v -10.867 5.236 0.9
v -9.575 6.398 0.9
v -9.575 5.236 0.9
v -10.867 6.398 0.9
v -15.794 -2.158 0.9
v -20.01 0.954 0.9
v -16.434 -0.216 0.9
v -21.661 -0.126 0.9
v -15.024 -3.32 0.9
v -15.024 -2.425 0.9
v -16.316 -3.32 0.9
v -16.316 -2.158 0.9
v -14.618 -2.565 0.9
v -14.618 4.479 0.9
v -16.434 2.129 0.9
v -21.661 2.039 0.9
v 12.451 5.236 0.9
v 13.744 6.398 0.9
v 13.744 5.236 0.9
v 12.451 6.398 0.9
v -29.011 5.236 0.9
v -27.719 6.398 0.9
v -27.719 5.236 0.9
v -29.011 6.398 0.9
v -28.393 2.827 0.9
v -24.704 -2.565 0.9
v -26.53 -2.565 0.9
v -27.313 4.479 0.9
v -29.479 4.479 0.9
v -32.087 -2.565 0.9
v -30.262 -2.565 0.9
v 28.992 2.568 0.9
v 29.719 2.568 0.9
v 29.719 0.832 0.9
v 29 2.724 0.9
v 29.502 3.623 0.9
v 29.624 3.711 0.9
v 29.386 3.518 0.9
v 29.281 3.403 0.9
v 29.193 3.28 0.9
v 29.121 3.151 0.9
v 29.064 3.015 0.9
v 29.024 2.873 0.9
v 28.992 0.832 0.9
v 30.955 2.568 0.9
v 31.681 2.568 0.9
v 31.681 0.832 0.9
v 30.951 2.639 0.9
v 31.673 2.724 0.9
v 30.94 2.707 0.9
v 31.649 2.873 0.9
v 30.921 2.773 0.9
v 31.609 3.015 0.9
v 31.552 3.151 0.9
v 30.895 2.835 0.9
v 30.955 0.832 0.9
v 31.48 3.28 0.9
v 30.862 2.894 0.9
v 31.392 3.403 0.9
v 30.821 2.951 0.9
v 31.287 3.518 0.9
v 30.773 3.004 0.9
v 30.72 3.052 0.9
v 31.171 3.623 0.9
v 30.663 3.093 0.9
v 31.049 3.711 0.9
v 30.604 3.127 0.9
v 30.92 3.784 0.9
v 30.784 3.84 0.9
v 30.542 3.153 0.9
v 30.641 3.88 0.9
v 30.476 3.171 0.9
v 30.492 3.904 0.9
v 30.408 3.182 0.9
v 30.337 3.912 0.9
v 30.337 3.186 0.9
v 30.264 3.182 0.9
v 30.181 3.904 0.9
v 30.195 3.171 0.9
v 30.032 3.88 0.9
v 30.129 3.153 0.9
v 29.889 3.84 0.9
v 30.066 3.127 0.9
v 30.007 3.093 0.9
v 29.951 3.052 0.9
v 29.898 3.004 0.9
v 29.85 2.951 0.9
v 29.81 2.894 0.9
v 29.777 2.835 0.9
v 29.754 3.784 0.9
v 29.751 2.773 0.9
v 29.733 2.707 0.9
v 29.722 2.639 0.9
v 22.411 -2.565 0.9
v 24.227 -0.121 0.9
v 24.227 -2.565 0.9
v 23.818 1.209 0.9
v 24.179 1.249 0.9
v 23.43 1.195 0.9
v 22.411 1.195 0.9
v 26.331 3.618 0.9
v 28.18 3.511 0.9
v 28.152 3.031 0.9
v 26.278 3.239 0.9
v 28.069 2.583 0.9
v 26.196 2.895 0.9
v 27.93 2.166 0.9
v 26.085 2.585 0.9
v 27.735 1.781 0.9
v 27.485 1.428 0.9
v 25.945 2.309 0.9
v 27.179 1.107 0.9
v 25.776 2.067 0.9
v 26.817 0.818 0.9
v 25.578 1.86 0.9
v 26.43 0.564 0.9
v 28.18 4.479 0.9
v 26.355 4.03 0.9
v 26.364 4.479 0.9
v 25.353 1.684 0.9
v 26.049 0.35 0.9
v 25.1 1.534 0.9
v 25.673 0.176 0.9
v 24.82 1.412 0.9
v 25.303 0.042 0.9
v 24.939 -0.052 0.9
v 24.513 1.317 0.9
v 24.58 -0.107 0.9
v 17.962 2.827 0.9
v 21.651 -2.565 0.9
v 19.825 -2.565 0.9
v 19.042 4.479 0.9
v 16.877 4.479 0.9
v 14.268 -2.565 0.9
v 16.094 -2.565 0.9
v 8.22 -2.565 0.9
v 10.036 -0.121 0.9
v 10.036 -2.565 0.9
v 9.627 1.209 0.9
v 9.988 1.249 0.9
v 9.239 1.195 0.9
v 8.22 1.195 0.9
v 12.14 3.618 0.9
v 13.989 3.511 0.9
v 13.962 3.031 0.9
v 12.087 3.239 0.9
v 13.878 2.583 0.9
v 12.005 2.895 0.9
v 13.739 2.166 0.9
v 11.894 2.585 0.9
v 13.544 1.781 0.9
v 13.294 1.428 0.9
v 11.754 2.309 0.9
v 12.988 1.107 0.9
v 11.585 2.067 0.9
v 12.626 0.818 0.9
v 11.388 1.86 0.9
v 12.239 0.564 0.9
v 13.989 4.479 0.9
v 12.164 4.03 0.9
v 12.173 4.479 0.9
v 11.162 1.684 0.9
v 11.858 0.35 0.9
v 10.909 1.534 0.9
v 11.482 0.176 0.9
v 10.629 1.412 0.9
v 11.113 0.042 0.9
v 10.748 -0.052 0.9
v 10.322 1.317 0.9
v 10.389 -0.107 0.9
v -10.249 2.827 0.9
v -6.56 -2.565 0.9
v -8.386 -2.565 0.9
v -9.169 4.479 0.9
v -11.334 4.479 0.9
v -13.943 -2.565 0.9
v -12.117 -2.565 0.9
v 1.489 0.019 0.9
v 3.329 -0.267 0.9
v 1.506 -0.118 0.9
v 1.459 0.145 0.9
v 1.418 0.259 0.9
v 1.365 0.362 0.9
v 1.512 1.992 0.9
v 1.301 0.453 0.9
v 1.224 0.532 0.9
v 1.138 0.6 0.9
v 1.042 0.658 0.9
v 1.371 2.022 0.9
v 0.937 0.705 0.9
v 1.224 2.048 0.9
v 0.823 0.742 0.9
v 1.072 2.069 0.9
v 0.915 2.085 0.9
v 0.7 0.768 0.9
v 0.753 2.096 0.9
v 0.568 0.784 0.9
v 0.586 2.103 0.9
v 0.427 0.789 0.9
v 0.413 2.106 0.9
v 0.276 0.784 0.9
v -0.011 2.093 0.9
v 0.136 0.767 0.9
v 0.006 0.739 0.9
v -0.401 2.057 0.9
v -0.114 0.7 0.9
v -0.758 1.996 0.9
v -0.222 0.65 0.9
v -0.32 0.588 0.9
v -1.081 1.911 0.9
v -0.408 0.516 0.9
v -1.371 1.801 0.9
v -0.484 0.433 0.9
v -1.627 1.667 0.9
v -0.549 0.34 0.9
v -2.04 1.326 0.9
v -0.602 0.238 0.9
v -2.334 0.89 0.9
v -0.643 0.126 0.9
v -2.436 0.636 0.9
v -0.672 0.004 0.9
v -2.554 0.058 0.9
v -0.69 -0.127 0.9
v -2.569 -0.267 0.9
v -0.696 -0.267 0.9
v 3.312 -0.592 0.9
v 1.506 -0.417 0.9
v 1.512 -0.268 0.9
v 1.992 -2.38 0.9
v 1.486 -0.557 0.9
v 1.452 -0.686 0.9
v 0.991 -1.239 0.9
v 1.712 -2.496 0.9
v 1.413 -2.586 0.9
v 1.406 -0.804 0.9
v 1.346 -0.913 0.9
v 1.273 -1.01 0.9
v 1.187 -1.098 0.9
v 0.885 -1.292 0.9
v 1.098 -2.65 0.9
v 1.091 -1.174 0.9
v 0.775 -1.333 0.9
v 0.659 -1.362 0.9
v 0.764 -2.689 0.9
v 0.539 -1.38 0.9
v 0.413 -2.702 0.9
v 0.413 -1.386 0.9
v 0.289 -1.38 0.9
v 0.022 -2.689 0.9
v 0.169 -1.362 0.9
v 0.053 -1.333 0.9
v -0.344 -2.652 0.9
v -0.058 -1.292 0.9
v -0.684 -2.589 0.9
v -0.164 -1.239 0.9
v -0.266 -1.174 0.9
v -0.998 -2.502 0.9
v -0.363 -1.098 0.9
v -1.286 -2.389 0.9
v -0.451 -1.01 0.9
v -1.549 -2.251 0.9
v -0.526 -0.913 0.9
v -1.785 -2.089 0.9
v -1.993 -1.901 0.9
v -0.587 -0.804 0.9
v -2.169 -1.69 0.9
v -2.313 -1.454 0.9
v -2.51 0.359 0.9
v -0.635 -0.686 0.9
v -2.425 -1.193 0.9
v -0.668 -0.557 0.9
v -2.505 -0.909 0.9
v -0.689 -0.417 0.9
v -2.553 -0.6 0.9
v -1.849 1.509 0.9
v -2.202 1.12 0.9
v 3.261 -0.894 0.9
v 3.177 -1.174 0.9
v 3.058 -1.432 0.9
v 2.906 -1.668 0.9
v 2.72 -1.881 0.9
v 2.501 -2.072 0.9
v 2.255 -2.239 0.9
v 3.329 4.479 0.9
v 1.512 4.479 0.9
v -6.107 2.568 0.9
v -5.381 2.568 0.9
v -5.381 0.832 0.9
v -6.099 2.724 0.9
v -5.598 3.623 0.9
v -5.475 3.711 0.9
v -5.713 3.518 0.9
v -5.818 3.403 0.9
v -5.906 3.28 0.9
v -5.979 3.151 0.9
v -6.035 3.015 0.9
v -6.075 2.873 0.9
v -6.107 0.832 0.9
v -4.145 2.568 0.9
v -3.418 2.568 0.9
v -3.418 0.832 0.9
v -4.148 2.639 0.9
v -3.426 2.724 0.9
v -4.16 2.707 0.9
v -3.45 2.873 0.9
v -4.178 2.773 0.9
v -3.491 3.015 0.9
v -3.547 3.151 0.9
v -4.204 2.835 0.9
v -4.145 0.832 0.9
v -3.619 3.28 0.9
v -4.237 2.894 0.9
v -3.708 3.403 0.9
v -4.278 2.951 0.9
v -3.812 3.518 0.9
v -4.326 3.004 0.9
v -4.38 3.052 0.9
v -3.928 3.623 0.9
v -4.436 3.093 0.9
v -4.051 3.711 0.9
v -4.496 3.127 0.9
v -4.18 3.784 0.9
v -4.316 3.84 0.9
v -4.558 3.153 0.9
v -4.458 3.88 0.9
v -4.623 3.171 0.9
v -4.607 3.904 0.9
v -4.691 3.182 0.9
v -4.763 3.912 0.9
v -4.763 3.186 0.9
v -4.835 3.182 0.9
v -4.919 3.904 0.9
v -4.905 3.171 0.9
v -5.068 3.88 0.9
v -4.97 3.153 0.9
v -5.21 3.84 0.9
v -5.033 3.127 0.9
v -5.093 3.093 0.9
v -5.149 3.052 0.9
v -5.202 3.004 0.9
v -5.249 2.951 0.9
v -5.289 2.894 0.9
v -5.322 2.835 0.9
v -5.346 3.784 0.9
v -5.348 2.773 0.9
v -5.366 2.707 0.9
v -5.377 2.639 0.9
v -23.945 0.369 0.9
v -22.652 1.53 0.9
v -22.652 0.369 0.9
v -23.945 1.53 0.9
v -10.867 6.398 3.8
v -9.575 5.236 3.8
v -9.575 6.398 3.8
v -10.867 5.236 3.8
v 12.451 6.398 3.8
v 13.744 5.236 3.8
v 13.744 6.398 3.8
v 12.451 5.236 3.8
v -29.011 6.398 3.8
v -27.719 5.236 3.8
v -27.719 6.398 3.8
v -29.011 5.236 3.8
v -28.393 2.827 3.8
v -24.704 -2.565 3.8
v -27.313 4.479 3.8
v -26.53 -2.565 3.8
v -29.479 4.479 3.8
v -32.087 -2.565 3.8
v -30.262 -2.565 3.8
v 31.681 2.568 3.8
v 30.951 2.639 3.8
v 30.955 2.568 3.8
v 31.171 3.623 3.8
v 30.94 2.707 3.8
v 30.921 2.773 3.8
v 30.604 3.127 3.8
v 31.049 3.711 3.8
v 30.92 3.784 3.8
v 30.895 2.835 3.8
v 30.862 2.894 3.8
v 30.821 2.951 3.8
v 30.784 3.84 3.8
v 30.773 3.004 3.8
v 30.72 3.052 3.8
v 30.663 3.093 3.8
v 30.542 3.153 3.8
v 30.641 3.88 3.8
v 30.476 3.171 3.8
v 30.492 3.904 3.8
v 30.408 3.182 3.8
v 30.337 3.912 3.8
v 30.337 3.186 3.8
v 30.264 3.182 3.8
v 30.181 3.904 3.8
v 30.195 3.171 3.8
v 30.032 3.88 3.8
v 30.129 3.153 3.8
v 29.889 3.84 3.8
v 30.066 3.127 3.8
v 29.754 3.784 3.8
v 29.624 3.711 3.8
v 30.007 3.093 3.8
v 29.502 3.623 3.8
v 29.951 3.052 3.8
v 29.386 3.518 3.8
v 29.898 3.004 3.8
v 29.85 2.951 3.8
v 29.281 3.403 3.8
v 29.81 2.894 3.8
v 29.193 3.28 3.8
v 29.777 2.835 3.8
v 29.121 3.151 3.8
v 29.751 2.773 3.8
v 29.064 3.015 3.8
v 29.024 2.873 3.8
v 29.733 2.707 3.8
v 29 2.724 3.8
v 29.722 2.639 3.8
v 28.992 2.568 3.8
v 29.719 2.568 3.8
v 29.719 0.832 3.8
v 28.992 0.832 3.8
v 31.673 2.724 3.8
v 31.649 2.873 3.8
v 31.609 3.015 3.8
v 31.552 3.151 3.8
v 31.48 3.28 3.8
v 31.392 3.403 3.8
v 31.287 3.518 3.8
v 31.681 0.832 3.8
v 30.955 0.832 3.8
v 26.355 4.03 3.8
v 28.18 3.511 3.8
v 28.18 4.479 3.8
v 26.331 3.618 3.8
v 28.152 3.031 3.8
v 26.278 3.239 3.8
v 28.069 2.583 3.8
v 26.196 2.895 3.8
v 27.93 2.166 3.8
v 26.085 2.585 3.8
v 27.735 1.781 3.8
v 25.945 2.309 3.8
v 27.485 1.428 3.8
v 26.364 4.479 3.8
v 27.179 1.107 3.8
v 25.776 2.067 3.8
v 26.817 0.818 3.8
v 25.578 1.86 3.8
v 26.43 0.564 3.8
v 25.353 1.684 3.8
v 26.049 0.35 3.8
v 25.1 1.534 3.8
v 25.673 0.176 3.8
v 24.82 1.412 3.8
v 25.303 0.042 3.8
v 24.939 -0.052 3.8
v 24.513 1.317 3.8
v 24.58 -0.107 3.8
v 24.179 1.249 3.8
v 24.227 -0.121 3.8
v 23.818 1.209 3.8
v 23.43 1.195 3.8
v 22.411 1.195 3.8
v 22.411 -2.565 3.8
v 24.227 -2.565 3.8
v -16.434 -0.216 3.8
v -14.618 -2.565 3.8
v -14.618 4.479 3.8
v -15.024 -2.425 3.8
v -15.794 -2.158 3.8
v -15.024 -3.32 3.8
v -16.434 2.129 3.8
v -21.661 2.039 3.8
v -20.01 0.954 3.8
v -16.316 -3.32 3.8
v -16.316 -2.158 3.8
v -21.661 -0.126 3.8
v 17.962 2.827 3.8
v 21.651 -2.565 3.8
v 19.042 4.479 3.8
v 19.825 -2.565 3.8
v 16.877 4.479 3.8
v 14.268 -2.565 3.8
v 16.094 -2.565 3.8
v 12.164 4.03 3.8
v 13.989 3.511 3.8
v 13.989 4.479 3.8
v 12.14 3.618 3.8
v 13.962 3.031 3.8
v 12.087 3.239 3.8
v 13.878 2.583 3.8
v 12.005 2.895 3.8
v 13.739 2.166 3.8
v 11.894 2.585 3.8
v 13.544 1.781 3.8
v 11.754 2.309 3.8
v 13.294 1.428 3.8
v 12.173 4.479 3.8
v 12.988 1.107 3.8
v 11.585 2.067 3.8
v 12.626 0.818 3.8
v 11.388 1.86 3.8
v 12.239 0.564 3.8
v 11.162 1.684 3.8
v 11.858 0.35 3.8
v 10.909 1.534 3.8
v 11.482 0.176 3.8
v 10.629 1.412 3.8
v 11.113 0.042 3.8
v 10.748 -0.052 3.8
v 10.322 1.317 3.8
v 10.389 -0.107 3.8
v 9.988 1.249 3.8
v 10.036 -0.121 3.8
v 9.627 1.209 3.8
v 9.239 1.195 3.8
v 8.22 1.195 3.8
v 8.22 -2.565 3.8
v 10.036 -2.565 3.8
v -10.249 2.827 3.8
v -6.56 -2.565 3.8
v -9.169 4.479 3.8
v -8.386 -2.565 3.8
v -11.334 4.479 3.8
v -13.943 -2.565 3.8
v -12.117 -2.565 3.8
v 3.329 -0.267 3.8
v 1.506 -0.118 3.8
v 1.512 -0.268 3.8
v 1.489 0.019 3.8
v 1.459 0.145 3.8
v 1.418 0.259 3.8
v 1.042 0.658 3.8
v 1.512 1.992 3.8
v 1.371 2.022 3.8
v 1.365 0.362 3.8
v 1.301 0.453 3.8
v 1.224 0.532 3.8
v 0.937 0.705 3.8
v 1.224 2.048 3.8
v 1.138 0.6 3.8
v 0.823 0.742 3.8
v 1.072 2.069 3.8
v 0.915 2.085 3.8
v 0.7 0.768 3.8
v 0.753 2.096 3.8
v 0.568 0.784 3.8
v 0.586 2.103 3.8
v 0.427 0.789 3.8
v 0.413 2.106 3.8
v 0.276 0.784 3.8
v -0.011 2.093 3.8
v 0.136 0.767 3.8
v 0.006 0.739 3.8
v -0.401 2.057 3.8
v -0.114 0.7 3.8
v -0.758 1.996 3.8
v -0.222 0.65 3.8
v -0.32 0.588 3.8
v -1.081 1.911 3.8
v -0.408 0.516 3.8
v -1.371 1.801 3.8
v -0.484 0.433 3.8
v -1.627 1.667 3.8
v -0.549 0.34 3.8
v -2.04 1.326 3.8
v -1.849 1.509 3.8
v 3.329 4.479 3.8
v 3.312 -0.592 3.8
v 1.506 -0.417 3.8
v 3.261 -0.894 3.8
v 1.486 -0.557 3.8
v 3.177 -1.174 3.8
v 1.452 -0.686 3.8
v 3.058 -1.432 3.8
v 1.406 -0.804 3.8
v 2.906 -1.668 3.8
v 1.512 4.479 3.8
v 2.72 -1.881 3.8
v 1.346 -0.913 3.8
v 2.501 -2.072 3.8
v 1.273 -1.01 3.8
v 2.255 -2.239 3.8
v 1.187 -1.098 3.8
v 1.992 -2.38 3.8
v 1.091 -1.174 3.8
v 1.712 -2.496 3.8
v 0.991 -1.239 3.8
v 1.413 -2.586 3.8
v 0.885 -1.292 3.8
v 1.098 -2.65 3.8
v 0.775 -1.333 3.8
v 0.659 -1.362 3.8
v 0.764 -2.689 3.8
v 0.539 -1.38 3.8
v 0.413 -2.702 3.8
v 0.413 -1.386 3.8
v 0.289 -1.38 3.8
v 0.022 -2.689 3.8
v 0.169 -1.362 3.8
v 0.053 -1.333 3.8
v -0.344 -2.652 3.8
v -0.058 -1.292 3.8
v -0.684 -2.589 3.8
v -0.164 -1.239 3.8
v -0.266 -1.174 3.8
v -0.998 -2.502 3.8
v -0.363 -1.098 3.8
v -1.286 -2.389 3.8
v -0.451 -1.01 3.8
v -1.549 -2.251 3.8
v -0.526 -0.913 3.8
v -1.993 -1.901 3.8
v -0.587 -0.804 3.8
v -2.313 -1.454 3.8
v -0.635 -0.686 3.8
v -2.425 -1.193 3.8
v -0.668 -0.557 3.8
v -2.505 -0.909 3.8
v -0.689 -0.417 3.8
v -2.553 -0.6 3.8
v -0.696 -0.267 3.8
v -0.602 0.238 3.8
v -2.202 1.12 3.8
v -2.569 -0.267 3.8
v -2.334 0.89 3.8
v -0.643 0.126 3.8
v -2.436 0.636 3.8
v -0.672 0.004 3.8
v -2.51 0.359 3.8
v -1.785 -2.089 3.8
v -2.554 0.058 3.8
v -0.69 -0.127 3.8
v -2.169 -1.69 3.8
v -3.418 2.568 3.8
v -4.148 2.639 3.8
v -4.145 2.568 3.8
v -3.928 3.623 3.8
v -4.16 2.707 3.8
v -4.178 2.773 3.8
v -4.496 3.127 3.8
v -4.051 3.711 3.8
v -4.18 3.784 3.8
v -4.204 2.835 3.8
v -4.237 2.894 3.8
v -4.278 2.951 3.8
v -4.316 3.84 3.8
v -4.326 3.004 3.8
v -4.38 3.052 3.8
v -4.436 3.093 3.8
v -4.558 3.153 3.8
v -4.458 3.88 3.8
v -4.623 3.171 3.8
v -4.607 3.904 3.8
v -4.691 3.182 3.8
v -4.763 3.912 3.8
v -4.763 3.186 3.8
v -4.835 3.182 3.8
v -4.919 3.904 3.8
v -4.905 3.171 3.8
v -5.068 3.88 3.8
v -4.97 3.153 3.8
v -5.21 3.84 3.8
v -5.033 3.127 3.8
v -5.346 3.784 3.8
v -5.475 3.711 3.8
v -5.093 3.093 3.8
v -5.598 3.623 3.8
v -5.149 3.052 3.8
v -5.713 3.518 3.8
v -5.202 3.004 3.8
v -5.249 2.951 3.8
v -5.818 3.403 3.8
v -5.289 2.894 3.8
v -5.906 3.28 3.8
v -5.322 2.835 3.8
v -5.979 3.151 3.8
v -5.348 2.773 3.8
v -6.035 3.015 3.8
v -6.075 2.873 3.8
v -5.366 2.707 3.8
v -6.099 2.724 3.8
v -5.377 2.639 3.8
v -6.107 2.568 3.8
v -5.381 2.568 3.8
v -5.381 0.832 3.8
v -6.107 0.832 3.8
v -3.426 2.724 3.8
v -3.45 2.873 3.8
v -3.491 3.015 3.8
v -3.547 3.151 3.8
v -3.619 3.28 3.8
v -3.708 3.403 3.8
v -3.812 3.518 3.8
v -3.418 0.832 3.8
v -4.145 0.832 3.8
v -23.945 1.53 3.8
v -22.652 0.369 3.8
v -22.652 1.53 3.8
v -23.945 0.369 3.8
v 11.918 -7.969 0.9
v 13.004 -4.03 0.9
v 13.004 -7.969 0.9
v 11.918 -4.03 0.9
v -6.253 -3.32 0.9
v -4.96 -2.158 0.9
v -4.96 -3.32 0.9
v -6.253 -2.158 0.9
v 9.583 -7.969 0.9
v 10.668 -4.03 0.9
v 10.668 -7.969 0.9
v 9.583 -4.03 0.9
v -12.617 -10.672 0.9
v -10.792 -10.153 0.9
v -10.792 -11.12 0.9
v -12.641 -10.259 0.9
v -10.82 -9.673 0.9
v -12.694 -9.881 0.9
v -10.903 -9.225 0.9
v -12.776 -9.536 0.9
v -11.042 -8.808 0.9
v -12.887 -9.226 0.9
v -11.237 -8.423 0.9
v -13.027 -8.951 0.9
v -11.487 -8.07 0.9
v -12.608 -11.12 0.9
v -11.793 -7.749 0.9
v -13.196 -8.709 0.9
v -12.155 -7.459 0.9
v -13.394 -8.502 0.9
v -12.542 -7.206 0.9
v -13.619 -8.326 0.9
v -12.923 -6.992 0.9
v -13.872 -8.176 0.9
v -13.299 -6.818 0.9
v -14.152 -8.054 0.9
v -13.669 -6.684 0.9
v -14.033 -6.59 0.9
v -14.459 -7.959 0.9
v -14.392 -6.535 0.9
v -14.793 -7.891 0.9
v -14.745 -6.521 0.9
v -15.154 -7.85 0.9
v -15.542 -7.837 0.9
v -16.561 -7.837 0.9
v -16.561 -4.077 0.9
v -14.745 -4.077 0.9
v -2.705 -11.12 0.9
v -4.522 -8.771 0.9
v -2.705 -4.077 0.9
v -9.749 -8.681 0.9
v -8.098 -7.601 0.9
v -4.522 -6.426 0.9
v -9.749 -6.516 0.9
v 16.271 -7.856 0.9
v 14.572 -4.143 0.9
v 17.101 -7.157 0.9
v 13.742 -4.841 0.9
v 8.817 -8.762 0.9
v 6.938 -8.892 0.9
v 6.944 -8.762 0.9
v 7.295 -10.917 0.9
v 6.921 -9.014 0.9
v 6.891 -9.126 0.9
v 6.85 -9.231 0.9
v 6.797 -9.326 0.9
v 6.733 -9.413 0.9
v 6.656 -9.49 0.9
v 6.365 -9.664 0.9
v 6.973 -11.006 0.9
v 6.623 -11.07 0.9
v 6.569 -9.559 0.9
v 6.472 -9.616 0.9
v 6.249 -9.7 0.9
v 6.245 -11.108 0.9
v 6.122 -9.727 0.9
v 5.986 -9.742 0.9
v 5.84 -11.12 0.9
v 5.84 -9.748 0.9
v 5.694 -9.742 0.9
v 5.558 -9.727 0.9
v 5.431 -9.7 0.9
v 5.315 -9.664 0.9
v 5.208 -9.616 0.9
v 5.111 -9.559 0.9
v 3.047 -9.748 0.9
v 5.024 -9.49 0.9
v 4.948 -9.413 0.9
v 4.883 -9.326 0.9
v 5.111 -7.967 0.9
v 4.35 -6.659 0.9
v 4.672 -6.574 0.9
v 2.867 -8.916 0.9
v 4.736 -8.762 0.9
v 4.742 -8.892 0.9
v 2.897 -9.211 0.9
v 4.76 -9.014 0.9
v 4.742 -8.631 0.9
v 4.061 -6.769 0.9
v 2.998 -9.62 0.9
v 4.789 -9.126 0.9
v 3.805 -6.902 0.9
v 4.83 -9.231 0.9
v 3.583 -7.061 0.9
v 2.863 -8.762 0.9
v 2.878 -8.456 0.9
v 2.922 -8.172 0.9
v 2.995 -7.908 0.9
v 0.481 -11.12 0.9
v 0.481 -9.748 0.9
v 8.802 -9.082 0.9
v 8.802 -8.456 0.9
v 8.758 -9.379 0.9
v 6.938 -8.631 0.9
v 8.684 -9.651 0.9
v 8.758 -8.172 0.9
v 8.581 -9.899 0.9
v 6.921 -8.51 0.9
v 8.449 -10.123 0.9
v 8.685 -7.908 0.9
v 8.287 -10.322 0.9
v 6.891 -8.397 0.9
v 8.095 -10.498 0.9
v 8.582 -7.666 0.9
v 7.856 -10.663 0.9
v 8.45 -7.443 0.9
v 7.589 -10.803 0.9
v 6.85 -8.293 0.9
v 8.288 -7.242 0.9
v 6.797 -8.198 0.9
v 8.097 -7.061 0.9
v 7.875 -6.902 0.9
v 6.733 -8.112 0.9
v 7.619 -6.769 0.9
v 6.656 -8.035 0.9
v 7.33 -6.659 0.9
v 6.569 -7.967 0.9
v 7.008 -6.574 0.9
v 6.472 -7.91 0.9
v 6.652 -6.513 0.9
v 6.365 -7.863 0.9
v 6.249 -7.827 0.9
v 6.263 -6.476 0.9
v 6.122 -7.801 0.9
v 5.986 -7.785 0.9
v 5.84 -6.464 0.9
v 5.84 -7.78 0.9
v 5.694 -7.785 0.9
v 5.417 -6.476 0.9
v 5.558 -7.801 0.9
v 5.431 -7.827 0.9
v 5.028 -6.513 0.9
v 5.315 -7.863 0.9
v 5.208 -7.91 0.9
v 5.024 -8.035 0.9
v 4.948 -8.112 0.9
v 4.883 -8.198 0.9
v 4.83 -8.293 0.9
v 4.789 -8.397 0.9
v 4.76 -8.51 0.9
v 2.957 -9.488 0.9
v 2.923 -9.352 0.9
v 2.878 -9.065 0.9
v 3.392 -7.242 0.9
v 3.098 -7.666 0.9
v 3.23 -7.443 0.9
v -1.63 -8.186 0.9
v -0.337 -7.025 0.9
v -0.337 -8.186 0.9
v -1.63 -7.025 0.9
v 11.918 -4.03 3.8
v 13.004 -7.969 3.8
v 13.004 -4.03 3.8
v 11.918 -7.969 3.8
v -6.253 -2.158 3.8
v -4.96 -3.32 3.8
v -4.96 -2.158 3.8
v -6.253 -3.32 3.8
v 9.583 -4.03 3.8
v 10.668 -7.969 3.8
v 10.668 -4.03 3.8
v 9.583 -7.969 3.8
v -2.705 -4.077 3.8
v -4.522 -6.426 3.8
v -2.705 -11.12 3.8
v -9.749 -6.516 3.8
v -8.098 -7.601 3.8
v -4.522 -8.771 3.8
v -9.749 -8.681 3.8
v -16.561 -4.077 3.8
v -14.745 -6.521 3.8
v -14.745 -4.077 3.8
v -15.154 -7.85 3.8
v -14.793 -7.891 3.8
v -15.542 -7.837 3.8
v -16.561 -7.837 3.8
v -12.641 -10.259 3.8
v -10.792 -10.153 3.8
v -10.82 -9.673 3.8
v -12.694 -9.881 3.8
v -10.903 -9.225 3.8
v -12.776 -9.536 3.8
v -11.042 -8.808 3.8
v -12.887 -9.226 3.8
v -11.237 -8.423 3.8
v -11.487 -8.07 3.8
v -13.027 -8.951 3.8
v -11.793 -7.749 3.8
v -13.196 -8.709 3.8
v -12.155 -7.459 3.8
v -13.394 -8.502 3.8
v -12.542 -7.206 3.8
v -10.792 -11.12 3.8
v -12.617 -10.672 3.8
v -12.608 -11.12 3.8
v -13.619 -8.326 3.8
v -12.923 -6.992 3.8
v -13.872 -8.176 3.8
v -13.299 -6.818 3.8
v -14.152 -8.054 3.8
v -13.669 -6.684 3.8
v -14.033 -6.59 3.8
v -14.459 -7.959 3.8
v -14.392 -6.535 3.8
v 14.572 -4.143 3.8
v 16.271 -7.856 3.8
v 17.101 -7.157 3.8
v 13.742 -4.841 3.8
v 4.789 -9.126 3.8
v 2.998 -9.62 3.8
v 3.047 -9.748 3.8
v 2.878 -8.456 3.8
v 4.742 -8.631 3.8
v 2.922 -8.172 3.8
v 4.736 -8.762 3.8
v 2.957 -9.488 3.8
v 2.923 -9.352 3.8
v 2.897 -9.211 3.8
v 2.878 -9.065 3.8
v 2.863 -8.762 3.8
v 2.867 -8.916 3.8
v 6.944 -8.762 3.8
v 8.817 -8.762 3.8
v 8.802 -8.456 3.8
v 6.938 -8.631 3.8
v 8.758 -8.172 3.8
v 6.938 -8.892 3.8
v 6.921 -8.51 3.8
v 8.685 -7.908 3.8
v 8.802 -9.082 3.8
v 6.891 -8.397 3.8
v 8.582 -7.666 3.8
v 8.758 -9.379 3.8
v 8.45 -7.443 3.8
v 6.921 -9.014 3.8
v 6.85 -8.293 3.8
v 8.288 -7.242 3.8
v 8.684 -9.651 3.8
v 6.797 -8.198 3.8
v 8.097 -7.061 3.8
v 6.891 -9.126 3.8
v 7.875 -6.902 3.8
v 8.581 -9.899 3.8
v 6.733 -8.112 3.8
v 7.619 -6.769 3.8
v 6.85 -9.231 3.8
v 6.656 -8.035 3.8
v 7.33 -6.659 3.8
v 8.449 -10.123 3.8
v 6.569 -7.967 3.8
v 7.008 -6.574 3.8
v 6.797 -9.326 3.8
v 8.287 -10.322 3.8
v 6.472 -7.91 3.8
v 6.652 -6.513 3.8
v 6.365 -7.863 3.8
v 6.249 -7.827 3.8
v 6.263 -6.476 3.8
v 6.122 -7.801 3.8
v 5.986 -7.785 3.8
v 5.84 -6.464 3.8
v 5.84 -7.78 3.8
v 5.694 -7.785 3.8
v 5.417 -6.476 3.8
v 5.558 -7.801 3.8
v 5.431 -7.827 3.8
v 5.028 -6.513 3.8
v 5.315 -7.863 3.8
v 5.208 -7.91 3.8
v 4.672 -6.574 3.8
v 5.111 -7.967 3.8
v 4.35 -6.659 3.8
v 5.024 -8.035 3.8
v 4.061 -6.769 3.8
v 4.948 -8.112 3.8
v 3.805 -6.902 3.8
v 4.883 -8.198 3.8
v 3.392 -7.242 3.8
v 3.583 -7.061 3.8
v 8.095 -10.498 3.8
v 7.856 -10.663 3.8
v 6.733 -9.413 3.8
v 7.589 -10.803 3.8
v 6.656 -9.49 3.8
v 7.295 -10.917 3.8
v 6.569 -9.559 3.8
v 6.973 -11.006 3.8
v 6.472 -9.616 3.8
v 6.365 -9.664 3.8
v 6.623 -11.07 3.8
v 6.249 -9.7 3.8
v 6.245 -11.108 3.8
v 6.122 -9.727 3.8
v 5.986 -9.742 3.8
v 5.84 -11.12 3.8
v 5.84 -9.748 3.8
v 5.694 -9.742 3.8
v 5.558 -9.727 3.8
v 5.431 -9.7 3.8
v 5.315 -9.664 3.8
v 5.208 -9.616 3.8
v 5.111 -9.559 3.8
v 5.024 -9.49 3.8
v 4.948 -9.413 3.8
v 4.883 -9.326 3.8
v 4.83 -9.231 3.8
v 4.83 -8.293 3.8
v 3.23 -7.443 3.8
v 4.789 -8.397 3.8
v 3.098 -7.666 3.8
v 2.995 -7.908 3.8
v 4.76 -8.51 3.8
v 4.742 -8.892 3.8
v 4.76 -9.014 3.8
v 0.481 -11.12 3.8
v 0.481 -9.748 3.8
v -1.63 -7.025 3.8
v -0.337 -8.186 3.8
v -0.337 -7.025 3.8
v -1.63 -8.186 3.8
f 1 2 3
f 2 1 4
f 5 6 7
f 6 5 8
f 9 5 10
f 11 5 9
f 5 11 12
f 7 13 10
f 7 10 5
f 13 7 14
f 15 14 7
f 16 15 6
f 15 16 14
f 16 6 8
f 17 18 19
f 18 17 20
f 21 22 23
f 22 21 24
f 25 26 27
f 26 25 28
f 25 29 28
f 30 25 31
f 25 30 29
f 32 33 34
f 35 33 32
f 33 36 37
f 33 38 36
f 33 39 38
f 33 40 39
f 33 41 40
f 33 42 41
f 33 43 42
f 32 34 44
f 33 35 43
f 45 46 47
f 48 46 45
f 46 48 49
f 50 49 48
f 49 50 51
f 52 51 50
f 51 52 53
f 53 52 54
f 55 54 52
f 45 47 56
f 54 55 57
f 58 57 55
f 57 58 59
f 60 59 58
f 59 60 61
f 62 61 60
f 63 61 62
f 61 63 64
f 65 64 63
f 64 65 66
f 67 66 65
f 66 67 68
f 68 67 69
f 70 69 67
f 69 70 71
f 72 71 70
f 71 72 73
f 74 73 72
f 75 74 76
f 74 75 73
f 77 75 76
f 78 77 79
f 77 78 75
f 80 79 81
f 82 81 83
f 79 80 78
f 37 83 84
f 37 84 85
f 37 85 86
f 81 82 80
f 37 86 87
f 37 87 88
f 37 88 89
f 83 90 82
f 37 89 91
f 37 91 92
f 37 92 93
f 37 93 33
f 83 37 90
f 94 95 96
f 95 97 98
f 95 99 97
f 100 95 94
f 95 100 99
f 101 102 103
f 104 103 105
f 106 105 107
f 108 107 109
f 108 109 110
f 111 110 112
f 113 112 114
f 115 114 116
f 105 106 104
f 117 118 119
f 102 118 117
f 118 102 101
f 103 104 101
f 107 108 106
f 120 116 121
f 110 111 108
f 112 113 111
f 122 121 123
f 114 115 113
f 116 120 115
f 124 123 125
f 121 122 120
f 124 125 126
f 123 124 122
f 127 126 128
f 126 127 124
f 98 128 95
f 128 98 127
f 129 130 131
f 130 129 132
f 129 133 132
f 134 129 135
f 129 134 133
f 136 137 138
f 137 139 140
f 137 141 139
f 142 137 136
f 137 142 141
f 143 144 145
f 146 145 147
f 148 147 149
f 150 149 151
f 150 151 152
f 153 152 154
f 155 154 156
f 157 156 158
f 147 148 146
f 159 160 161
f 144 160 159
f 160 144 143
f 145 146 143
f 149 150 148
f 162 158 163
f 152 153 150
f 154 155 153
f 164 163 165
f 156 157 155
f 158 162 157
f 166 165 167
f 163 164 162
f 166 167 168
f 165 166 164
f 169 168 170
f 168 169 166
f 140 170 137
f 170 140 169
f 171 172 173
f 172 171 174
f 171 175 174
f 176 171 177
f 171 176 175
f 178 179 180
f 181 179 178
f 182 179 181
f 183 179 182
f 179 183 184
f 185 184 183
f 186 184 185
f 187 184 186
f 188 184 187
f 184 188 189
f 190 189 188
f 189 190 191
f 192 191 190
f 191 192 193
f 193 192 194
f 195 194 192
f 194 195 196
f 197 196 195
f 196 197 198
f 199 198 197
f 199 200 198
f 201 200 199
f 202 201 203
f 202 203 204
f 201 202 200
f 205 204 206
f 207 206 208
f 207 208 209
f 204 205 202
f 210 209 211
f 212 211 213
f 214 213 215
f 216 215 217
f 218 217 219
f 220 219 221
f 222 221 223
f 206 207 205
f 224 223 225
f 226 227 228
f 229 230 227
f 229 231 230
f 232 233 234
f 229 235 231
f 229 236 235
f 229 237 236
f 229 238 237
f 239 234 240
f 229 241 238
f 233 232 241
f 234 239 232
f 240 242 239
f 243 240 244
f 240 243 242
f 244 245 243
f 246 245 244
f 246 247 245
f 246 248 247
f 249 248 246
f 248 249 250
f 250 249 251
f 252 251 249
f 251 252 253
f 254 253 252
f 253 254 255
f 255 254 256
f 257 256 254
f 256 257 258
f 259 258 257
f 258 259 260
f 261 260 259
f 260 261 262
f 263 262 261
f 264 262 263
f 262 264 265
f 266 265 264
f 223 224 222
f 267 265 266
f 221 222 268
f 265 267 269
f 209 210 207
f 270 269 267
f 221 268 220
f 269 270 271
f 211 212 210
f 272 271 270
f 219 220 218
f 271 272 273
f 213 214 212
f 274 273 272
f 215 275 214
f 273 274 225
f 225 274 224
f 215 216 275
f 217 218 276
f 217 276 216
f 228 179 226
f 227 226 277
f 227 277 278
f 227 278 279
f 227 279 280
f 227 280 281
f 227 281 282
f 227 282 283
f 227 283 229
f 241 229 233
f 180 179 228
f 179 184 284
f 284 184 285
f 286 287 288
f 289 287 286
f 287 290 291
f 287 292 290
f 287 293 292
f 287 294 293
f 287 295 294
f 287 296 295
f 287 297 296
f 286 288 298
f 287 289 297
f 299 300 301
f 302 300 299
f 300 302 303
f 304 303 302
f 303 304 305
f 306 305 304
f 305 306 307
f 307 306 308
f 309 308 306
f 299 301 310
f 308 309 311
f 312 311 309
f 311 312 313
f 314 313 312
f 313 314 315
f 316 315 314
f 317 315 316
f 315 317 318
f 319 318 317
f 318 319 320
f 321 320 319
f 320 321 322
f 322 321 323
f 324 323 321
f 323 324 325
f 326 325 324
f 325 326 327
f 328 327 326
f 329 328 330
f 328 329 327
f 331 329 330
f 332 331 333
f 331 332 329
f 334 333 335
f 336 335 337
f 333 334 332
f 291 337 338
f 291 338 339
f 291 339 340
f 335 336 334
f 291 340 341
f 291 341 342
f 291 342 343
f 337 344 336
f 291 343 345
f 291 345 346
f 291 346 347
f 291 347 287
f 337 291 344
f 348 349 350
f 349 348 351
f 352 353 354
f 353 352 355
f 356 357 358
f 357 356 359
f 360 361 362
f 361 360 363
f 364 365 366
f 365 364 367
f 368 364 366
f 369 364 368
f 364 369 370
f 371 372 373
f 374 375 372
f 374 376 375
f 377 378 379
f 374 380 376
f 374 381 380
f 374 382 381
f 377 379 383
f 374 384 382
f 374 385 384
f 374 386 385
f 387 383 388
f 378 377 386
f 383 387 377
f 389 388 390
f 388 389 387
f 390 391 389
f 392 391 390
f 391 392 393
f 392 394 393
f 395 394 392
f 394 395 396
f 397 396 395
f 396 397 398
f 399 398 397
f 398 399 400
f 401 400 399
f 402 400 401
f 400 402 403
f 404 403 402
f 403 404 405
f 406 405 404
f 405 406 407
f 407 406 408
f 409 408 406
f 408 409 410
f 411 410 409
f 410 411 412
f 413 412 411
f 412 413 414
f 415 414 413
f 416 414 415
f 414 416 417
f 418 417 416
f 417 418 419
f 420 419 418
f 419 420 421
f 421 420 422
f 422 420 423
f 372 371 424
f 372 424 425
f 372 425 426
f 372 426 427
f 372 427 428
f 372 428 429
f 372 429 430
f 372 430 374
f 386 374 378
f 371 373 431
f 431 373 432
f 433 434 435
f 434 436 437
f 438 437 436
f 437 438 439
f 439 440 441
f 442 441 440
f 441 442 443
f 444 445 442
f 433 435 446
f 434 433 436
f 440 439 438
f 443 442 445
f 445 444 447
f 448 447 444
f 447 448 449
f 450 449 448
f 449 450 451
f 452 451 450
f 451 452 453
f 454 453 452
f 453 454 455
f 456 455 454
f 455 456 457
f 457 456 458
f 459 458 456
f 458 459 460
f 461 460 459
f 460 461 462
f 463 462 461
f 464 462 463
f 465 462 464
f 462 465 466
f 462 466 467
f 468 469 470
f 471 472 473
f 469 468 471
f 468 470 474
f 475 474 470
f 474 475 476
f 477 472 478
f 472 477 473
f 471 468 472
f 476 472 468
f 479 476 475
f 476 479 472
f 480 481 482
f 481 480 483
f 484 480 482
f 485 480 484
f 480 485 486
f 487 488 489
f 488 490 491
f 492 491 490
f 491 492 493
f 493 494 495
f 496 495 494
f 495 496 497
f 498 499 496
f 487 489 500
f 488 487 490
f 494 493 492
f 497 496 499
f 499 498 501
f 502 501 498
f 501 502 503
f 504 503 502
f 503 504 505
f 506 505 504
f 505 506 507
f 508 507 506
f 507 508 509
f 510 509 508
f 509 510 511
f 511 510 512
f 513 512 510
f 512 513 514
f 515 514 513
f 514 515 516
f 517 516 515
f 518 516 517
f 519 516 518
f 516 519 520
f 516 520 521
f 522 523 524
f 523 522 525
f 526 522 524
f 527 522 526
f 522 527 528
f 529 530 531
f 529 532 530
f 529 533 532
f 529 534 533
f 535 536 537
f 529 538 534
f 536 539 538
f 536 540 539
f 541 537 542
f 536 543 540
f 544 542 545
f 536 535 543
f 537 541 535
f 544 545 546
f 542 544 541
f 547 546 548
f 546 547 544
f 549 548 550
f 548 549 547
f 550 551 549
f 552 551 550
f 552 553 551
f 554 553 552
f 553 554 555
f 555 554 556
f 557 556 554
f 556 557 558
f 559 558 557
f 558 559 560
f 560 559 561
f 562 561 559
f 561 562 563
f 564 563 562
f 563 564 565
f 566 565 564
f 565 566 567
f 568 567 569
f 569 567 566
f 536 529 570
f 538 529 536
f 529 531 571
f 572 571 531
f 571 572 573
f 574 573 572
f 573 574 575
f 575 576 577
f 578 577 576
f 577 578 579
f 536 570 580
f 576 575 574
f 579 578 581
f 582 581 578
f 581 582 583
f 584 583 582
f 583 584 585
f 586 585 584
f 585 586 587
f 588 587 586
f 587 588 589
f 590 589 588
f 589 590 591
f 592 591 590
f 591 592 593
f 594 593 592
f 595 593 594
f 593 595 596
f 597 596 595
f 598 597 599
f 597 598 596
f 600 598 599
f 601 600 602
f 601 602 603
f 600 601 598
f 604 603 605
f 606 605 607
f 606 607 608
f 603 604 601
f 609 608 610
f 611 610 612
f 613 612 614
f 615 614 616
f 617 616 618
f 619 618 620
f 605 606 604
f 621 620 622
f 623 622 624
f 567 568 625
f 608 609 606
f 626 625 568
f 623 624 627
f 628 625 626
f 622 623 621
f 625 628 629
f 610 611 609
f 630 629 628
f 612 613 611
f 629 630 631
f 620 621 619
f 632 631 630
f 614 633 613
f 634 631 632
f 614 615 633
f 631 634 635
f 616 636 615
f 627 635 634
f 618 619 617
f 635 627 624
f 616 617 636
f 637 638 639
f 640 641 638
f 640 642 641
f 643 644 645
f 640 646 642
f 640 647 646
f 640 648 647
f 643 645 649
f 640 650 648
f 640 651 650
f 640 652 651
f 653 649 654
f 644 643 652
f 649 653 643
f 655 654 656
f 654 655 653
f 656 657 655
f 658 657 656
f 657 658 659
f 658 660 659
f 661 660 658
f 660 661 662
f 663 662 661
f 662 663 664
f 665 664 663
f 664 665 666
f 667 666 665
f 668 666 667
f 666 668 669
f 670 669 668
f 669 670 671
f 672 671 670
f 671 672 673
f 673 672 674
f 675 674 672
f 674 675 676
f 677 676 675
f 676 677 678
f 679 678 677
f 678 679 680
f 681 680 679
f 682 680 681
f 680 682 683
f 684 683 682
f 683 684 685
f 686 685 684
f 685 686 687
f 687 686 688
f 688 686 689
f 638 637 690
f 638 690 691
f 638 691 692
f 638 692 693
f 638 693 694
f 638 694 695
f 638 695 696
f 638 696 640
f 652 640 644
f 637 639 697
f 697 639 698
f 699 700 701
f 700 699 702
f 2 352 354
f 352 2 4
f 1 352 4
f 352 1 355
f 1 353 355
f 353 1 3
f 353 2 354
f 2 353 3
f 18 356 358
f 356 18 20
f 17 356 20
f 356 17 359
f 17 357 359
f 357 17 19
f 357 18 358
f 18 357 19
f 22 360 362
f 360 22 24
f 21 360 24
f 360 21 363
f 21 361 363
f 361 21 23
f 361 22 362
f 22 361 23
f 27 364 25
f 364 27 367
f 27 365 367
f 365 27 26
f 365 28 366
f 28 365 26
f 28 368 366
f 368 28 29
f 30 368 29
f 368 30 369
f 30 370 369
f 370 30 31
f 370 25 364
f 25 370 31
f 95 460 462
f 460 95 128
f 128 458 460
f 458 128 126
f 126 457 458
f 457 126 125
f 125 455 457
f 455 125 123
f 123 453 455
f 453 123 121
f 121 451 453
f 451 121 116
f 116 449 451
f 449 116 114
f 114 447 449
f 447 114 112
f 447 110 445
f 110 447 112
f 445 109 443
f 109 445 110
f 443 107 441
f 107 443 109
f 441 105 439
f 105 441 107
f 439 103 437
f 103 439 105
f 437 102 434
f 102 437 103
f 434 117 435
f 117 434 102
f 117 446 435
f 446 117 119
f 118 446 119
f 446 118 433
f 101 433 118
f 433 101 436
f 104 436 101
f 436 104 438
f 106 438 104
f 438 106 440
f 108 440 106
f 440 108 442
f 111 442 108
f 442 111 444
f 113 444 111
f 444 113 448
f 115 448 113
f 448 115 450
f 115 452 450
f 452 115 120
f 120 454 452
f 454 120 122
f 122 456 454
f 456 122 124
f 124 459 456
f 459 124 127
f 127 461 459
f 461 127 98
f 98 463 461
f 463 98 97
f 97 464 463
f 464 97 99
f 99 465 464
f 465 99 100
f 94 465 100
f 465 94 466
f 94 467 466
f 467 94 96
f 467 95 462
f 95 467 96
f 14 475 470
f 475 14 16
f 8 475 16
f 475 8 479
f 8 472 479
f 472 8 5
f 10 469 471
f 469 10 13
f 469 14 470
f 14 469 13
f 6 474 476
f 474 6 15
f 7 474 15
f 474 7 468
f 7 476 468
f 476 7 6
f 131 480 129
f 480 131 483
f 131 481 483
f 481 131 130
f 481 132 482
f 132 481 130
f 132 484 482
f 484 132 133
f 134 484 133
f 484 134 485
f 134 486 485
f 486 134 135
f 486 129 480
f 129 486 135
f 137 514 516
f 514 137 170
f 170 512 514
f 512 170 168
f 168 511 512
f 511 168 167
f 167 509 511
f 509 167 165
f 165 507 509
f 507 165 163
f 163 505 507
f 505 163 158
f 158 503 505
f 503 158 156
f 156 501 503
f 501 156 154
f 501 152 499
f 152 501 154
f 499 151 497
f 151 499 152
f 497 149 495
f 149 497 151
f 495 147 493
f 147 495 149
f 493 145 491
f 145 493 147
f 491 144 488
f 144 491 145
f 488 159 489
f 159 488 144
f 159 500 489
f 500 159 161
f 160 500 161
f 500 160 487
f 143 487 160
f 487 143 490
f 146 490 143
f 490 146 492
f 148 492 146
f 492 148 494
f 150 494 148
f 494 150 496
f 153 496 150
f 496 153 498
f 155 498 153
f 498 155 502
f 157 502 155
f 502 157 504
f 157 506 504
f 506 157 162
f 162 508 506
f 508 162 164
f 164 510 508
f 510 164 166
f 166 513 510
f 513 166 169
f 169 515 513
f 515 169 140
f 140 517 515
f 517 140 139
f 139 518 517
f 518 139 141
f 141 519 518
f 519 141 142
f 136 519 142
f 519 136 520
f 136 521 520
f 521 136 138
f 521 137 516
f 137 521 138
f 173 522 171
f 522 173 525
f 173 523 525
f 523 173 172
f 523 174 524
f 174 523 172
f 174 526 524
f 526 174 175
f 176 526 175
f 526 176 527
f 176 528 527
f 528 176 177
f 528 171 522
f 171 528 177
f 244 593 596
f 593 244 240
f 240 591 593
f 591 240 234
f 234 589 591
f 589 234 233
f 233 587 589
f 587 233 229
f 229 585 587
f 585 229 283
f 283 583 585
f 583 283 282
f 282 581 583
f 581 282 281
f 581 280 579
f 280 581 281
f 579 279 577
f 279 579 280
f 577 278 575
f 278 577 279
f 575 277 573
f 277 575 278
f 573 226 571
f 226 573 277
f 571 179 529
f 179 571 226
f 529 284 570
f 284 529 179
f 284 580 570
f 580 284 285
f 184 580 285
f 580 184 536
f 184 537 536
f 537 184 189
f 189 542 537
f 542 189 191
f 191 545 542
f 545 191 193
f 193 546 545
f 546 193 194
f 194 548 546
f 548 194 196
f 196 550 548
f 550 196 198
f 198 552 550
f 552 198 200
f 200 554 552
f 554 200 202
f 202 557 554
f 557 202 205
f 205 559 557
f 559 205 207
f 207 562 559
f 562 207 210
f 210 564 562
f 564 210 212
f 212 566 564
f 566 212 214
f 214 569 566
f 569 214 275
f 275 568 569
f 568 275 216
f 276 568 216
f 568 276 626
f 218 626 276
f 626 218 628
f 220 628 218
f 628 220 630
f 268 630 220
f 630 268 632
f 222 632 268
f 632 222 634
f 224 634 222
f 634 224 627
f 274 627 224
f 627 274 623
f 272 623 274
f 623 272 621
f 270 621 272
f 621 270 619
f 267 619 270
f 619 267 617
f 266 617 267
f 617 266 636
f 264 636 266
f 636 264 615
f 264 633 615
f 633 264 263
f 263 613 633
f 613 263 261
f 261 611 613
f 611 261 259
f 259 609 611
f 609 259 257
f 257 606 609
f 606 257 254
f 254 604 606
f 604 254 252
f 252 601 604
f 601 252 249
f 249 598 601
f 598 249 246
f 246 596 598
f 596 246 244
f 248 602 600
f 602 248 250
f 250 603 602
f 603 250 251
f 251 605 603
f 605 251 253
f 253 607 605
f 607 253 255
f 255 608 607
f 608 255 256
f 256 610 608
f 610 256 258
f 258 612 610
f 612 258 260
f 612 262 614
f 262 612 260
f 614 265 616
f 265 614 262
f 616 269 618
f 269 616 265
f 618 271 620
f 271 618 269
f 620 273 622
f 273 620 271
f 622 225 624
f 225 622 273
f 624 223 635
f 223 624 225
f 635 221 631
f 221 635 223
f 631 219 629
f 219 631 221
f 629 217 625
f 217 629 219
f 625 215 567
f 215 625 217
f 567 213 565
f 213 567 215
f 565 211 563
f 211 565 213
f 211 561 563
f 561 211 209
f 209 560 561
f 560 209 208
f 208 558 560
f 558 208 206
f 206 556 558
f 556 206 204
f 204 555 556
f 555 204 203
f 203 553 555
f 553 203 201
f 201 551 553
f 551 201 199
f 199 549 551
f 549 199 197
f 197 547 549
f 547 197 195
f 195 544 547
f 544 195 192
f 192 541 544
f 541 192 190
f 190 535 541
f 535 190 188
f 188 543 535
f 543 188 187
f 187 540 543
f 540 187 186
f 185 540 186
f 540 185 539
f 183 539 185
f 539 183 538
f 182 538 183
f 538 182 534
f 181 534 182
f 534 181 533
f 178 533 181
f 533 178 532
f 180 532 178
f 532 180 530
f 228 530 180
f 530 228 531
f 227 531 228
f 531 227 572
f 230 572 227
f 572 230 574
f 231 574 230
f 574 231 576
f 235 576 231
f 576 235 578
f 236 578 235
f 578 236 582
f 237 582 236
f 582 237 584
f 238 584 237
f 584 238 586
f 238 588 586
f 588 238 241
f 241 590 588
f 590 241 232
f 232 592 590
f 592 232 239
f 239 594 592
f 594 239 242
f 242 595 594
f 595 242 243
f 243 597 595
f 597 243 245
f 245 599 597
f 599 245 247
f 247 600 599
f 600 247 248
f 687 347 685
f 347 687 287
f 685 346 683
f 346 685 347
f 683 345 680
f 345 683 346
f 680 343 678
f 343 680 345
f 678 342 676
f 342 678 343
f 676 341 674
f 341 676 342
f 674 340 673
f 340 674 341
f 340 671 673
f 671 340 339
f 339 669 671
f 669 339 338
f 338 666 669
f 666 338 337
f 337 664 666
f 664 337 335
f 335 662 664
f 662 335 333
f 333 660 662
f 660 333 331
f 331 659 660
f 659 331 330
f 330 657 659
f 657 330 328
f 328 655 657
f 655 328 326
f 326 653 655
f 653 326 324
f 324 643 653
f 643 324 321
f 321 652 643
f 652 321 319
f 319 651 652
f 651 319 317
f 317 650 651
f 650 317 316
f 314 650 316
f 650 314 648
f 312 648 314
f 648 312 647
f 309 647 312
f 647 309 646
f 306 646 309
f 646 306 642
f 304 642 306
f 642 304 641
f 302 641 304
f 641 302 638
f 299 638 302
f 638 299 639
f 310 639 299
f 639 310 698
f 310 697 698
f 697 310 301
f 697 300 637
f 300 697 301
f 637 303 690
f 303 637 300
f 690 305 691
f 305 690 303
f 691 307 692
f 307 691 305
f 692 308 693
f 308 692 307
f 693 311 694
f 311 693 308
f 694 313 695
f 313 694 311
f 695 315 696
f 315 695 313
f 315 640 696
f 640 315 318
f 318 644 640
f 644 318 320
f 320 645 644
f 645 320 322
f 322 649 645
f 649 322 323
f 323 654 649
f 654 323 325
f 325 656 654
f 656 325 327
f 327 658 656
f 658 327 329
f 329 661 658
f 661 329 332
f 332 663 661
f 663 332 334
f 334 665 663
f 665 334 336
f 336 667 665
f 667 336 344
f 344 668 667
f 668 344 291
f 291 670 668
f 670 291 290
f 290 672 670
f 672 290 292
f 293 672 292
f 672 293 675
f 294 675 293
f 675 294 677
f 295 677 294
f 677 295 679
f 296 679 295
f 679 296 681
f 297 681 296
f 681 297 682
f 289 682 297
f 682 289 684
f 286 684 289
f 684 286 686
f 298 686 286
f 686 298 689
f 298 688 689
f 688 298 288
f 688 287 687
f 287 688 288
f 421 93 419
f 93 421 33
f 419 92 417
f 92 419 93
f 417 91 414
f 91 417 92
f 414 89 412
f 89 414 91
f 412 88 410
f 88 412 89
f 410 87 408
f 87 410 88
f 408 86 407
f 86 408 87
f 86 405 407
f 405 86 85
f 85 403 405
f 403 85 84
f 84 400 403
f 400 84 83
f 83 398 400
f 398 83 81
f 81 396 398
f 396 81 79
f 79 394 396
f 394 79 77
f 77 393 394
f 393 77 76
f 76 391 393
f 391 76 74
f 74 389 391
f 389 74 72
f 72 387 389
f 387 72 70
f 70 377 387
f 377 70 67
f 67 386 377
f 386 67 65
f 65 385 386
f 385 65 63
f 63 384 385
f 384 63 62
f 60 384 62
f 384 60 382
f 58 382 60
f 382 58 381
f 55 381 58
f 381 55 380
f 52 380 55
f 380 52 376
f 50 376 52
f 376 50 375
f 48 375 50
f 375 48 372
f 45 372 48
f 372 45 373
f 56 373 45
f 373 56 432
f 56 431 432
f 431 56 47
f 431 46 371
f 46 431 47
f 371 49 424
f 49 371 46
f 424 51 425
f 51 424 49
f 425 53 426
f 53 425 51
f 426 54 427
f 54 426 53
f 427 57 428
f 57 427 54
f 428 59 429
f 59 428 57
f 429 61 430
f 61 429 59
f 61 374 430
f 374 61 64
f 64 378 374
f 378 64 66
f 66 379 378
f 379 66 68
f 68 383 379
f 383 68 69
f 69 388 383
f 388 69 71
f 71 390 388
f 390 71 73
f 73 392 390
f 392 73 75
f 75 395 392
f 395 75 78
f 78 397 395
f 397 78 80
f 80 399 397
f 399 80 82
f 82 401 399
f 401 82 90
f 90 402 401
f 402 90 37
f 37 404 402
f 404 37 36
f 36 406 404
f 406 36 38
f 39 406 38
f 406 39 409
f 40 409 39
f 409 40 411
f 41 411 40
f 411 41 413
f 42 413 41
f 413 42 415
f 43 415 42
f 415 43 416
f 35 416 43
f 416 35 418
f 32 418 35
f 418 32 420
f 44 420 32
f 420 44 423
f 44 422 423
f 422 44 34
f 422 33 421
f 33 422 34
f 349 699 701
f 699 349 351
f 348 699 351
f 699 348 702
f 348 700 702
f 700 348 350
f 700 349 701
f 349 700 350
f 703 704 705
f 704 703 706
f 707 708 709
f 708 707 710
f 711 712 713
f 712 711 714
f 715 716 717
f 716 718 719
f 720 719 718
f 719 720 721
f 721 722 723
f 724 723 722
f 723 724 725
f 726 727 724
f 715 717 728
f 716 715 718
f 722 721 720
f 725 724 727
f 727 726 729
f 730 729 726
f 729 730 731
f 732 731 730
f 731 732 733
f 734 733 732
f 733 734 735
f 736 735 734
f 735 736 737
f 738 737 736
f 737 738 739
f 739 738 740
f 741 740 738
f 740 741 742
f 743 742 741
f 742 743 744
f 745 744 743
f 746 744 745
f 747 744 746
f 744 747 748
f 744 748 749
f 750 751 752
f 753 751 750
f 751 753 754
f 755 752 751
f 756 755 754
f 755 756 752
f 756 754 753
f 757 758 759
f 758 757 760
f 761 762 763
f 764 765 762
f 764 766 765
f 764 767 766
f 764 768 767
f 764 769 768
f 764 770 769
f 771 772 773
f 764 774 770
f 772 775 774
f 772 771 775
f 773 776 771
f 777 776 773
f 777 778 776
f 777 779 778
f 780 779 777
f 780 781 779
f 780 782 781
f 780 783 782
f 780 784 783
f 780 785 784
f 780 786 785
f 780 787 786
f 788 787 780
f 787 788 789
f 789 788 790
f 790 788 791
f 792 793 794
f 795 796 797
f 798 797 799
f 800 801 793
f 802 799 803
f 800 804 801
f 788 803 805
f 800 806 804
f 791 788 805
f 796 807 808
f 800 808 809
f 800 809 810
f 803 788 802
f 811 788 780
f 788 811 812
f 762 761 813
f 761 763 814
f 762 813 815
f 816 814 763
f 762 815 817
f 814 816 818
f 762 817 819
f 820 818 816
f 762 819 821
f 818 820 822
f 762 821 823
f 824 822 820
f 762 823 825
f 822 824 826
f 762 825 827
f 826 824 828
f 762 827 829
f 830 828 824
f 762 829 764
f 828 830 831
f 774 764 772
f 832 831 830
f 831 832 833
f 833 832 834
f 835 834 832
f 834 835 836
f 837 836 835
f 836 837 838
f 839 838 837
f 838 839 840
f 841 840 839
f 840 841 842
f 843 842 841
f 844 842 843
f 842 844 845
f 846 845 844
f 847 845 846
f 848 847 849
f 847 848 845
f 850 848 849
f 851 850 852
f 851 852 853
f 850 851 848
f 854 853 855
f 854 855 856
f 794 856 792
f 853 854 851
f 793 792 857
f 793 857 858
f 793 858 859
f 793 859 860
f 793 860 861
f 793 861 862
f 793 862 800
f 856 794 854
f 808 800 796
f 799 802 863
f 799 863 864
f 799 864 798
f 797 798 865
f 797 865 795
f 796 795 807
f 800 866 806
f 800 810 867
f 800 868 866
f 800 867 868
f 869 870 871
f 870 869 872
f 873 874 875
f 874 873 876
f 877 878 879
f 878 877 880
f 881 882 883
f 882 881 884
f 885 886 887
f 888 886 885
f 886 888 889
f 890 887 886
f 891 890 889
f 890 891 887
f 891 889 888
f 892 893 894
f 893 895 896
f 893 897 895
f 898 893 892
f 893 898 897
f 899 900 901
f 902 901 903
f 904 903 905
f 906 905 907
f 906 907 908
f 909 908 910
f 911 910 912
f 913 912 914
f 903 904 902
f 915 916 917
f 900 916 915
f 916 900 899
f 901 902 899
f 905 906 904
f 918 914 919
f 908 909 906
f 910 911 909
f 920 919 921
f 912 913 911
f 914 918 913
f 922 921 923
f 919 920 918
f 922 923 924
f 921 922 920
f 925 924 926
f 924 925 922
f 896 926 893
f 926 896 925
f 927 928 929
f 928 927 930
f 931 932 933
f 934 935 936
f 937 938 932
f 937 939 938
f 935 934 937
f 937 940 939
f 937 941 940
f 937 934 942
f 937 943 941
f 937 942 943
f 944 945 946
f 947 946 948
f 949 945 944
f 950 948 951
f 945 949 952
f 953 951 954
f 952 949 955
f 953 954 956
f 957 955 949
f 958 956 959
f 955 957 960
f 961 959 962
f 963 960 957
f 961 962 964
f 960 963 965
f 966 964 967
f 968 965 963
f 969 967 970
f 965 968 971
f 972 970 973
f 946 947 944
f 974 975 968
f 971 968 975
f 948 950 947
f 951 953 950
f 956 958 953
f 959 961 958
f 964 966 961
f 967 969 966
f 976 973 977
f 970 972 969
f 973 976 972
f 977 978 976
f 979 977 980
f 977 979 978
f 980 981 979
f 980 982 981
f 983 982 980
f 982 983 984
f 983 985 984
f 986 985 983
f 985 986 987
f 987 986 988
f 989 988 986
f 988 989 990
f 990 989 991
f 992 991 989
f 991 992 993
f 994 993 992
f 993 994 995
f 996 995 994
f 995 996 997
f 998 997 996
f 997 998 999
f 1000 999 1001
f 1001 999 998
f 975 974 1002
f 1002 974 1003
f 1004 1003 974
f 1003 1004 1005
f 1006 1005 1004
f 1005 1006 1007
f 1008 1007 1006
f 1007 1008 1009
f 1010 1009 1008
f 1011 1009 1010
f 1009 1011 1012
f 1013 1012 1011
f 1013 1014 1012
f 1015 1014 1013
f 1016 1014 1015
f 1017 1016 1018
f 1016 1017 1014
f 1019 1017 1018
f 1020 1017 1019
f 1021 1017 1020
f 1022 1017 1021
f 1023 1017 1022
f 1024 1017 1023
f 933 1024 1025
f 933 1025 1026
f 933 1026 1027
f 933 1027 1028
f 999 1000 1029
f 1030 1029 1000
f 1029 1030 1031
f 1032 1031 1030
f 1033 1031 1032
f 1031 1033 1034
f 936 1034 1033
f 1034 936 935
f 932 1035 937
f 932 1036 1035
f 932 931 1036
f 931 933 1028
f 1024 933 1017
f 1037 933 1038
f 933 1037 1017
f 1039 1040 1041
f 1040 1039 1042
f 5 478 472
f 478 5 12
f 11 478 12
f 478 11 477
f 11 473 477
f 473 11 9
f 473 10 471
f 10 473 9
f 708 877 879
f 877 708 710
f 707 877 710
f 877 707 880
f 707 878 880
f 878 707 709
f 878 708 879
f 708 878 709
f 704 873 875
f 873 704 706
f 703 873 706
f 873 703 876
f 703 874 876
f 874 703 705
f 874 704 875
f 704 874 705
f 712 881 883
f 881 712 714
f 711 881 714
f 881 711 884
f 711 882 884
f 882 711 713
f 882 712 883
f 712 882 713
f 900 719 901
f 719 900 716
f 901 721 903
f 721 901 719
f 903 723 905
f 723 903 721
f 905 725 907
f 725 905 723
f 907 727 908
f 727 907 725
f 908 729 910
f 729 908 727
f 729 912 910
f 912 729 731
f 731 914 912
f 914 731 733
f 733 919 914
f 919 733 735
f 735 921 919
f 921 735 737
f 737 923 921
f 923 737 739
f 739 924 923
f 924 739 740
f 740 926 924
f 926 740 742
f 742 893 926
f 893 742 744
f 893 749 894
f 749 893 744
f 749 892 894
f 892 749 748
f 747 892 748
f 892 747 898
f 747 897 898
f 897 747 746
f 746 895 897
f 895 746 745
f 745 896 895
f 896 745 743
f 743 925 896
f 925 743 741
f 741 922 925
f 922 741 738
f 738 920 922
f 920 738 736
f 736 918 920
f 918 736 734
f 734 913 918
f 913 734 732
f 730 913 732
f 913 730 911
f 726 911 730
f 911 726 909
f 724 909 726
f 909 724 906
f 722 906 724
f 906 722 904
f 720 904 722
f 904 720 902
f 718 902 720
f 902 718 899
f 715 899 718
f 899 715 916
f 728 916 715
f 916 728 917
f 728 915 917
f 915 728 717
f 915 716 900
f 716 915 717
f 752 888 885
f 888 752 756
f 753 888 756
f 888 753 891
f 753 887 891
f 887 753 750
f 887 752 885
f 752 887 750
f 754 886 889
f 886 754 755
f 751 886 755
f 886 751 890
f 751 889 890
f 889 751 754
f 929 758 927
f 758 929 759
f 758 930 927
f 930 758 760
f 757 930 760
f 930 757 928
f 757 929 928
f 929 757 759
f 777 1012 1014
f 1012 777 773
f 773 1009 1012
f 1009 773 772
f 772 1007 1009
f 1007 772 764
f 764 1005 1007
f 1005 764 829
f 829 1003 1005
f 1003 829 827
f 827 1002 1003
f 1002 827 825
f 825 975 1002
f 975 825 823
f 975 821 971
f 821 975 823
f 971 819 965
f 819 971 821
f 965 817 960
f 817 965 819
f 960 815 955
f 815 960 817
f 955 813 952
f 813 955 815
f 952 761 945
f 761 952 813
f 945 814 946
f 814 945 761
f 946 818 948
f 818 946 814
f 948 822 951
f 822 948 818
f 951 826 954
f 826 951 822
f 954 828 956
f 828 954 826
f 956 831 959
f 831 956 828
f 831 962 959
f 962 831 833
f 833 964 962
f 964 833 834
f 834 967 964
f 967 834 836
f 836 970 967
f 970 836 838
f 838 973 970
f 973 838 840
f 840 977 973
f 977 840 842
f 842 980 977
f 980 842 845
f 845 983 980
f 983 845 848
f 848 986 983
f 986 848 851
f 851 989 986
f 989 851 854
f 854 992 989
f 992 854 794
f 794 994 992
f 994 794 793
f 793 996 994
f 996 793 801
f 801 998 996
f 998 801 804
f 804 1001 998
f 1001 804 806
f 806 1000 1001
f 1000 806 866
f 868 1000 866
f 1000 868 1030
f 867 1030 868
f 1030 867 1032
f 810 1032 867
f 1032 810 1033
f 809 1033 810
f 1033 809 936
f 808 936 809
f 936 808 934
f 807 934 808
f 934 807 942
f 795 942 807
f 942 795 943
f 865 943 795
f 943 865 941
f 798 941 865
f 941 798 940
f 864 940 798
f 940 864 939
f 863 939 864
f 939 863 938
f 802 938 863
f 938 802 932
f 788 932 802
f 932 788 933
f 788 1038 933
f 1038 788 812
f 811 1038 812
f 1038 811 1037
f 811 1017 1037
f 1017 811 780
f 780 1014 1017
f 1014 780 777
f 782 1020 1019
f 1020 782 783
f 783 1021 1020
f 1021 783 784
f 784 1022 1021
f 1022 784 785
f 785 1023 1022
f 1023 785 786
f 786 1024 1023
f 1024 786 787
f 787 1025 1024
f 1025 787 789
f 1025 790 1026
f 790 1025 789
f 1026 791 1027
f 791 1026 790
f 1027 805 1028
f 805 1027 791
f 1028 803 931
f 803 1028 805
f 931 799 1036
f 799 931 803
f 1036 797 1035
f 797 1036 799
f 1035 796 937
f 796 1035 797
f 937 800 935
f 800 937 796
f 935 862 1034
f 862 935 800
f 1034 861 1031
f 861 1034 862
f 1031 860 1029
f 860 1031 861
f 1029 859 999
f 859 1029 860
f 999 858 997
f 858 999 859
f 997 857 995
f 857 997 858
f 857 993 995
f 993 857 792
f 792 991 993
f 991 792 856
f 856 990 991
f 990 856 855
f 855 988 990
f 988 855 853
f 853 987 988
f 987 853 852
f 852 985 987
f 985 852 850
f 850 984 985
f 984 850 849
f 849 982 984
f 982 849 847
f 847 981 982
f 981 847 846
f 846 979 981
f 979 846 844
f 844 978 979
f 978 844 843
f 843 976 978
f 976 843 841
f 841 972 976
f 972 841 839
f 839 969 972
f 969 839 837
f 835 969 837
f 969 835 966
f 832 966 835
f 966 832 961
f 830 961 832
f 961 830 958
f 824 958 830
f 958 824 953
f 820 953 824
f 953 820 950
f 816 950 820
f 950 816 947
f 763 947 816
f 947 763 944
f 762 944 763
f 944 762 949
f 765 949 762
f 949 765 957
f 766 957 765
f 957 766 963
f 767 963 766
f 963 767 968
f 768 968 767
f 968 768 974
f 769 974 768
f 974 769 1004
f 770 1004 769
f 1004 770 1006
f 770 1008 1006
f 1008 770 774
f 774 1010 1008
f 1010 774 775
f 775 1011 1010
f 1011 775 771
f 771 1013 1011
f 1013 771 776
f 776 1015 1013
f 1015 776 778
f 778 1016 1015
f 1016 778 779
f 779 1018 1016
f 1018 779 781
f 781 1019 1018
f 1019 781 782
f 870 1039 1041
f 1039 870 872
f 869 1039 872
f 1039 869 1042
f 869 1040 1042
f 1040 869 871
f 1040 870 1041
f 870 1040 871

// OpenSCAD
$fn = 48;
  // syllabics (overlaid on icon, tallest)
  translate([0, 1.744, 0.900]) linear_extrude(height=2.900) text("ᐲᐗᐲᐢᑯ ᓰᐱᓯᐢ", size=6.957, halign="center", valign="center", font="Euphemia UCAS:style=Bold");
  translate([0, -6.744, 0.900]) linear_extrude(height=2.900) text("ᓵᐚᓄᐦᐠ", size=6.957, halign="center", valign="center", font="Euphemia UCAS:style=Bold");
